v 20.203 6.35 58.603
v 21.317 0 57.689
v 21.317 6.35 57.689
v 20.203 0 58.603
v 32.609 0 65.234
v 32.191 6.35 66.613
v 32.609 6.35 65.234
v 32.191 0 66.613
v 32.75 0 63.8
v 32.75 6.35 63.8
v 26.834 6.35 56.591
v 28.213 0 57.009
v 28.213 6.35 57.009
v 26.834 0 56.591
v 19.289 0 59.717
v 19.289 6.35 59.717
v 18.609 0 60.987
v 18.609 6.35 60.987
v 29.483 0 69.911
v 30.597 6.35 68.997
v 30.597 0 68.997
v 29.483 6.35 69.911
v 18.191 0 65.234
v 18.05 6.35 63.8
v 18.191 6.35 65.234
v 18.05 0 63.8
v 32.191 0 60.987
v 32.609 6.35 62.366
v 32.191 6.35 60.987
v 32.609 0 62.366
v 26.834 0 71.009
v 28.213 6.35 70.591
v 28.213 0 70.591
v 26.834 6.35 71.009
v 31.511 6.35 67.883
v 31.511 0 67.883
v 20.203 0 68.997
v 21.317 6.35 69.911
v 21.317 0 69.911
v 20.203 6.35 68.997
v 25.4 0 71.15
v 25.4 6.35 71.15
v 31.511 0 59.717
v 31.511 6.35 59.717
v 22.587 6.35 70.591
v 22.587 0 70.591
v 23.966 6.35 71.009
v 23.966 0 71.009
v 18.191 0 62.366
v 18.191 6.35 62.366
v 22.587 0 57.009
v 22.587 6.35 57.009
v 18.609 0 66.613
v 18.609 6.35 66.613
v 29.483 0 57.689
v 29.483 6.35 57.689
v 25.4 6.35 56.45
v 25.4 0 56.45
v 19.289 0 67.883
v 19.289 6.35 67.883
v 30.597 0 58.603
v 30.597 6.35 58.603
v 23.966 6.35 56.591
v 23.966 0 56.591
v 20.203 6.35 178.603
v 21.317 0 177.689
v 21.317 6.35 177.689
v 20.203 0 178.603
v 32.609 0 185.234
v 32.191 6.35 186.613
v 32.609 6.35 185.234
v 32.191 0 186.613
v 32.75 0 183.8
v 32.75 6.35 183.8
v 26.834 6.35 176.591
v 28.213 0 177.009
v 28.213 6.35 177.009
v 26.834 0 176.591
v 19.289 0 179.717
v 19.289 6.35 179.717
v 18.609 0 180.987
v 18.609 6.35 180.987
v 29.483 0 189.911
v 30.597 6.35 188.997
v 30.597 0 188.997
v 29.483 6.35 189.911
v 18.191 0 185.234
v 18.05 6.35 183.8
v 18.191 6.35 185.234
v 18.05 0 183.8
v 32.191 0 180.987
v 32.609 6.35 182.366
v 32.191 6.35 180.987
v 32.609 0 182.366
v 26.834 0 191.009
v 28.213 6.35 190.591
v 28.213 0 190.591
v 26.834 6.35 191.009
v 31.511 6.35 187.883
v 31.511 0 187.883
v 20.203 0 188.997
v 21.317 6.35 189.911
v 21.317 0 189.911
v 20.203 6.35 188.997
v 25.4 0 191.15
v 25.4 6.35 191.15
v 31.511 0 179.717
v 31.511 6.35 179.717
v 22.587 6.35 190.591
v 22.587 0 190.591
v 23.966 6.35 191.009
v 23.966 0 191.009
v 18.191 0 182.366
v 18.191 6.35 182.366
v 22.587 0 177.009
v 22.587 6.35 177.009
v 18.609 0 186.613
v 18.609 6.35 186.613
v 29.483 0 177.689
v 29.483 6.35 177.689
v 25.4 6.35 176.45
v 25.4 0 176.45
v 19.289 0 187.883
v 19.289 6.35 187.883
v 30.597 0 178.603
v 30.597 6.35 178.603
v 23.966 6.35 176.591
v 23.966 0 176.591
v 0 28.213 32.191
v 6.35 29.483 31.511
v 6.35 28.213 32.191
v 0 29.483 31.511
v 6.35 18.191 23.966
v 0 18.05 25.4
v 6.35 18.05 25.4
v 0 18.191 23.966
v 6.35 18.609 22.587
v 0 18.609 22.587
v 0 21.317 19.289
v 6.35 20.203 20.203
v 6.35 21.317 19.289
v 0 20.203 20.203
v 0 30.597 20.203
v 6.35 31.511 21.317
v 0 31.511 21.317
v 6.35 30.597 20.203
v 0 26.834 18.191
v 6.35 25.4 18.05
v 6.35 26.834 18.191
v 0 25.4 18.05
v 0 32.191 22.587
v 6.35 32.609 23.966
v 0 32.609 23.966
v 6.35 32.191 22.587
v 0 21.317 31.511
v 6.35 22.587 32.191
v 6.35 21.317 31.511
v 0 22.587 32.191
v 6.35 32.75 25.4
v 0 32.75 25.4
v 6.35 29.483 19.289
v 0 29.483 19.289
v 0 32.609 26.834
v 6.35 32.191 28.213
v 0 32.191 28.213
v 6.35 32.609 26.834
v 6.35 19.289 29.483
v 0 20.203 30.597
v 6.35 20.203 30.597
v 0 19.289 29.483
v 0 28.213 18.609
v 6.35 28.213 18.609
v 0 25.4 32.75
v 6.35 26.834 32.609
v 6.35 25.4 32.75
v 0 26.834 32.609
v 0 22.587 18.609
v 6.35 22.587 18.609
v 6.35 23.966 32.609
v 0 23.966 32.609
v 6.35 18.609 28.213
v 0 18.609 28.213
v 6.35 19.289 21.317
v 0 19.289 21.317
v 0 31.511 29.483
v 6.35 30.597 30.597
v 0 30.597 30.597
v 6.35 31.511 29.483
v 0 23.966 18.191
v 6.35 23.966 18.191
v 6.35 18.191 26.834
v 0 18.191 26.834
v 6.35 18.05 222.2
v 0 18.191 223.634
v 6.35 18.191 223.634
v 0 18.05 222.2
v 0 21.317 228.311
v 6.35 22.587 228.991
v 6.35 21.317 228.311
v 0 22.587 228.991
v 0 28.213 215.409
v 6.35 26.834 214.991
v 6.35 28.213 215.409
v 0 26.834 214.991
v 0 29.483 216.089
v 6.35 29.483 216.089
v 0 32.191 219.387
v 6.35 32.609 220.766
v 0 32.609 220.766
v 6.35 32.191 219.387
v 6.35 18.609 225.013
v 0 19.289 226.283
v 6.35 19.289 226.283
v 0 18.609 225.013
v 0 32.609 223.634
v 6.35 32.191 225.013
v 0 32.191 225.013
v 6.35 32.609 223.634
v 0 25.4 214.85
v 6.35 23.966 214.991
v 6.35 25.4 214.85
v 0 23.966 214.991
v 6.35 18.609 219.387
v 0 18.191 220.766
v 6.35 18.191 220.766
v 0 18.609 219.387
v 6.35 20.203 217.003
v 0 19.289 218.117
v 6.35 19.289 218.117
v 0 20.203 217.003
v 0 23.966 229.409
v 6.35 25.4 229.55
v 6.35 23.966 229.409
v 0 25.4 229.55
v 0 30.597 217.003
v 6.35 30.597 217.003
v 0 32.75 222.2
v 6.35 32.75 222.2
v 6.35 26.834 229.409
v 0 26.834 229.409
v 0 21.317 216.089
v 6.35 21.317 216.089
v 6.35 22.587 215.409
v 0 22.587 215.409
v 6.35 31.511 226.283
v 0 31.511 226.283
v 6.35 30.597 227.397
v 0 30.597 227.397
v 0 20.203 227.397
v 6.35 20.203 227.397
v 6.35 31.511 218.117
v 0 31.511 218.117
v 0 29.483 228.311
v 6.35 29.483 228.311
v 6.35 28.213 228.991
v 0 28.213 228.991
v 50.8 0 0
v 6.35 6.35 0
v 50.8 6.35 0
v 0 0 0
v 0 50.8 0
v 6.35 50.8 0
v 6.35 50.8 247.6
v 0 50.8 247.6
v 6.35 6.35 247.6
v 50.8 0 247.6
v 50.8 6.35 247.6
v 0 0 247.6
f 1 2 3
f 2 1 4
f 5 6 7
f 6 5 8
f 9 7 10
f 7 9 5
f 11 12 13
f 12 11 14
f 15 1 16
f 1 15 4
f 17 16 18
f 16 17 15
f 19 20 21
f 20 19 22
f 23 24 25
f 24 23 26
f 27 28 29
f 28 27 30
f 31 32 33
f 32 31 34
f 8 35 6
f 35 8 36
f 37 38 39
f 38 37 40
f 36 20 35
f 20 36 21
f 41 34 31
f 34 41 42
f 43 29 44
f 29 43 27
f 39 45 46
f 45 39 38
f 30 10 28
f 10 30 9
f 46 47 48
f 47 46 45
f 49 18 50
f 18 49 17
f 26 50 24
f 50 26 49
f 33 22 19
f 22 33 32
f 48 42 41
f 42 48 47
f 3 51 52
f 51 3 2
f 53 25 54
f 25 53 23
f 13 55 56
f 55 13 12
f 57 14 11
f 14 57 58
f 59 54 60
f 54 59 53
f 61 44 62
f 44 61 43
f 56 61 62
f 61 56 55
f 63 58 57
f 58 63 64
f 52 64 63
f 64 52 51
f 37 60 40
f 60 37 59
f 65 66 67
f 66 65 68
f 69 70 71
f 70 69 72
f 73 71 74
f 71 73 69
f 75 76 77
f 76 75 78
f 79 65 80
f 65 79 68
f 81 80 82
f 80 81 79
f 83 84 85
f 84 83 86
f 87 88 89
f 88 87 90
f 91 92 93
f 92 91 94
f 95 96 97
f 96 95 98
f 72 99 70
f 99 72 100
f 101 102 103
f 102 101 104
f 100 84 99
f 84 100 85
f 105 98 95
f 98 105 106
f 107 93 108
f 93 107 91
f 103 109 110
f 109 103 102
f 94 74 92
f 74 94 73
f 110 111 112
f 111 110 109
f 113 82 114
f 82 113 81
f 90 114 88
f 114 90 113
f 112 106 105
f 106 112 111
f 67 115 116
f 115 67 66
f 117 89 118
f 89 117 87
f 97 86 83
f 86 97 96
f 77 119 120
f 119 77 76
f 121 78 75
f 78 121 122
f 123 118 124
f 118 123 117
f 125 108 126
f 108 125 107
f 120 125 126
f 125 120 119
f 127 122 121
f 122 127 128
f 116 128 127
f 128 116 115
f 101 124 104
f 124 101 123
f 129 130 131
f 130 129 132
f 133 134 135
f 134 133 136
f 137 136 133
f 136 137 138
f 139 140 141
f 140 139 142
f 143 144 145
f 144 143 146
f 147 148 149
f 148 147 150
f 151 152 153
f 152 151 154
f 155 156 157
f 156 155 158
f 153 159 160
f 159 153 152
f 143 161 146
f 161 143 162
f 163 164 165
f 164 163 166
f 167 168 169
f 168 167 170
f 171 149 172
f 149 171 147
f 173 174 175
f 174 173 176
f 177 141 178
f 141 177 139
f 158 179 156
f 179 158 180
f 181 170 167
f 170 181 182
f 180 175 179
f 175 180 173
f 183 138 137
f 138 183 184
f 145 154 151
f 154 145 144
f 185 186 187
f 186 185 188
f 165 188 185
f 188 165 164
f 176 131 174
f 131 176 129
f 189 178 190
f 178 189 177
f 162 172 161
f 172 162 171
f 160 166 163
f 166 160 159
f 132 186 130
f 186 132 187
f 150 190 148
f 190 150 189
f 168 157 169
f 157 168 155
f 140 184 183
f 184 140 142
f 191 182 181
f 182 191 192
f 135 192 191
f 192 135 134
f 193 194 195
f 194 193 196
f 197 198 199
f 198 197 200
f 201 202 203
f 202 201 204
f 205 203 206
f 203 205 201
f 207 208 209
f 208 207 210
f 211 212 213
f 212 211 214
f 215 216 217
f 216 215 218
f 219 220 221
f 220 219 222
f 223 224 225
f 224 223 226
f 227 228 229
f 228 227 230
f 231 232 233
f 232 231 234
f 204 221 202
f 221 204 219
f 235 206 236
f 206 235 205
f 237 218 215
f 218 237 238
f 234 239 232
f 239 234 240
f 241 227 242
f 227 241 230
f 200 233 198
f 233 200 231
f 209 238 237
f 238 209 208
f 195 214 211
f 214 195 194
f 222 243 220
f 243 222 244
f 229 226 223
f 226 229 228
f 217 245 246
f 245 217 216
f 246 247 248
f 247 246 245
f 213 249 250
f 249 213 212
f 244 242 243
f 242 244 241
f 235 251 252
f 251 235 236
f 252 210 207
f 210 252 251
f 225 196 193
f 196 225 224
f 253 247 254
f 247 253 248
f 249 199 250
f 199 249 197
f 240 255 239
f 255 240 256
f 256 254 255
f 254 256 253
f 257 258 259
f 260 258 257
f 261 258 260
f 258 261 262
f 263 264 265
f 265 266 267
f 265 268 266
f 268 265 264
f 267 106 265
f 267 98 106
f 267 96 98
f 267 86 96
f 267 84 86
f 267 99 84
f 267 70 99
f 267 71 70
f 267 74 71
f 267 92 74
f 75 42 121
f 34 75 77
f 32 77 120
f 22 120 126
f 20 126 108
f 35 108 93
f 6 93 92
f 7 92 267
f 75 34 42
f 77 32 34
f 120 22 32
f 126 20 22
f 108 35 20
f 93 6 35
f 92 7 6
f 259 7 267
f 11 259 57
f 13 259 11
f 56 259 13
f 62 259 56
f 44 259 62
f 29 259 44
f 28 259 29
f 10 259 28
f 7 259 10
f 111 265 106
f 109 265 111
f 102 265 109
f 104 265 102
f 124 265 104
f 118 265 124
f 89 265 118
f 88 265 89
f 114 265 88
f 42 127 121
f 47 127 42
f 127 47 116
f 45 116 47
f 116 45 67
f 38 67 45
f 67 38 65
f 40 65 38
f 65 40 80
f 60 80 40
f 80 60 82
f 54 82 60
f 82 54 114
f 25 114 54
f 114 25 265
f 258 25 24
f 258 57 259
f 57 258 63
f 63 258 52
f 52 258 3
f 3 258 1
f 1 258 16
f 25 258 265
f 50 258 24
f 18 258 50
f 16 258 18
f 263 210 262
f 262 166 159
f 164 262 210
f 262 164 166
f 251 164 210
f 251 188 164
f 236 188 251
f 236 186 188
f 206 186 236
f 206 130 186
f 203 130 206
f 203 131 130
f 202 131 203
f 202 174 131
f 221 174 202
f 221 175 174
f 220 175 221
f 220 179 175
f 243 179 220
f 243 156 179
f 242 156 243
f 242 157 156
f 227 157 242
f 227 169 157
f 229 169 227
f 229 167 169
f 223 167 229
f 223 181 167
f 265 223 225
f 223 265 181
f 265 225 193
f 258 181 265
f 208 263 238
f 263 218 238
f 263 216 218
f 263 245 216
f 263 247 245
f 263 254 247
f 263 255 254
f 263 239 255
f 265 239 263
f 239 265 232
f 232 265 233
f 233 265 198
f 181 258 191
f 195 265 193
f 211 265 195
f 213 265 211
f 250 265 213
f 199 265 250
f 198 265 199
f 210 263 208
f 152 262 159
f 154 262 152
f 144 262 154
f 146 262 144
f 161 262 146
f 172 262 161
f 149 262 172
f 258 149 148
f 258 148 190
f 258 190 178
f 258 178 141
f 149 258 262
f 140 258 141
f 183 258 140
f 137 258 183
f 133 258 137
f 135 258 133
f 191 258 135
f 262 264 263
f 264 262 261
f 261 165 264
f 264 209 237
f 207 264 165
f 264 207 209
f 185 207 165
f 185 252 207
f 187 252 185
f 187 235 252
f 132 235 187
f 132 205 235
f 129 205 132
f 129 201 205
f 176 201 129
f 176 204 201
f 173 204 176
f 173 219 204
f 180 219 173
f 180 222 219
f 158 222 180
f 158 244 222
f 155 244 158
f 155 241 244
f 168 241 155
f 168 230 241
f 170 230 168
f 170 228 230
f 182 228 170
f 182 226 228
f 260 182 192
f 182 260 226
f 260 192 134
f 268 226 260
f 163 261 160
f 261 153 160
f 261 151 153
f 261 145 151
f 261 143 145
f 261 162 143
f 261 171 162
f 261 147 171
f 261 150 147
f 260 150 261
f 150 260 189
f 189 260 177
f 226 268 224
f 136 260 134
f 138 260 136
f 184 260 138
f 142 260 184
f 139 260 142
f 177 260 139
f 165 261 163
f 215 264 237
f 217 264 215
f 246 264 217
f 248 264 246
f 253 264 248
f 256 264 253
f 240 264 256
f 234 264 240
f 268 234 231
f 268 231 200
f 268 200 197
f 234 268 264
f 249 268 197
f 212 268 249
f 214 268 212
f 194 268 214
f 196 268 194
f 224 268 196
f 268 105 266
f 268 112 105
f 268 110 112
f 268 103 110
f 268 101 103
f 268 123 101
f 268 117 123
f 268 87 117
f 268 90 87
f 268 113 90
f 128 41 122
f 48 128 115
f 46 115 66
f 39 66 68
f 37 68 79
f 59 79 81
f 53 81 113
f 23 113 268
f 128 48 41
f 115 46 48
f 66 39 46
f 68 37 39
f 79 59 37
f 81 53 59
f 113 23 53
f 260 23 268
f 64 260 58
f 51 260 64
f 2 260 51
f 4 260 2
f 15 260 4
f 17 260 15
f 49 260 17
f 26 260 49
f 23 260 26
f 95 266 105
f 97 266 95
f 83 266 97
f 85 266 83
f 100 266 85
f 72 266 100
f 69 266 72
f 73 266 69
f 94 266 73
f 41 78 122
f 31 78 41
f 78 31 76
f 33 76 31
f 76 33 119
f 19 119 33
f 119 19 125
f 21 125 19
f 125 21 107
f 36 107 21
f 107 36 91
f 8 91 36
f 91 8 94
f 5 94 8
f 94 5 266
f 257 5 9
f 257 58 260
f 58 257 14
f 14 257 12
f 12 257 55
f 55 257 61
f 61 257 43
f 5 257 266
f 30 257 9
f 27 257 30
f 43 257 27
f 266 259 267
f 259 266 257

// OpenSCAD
// Part A7: Platform Side Angle Iron (Left and Right)
// Material: 2"×2"×1/4" Angle Iron (50.8mm leg × 6.35mm thickness)
// Quantity: 2 pieces (1 left, 1 right - mirror)
// Location: Folding standing platform, side arms connecting deck to pivot brackets
//
// These are the structural arms that rotate about the pivot point
// They connect the deck plate to the pivot bracket plates

include <../../lifetrac_v25_params.scad>

// =============================================================================
// PART DIMENSIONS
// =============================================================================

_leg = is_undef(PLATFORM_ANGLE_LEG) ? 50.8 : PLATFORM_ANGLE_LEG;       // 2" = 50.8mm
_thick = is_undef(PLATFORM_ANGLE_THICK) ? 6.35 : PLATFORM_ANGLE_THICK; // 1/4" = 6.35mm
_arm_len = is_undef(PLATFORM_ARM_LENGTH) ? 500 : PLATFORM_ARM_LENGTH;
_bracket_width = is_undef(PLATFORM_BRACKET_WIDTH) ? 101.6 : PLATFORM_BRACKET_WIDTH;
_depth = is_undef(PLATFORM_DEPTH) ? 400 : PLATFORM_DEPTH;
_edge_margin = is_undef(PLATFORM_EDGE_MARGIN) ? 12.7 : PLATFORM_EDGE_MARGIN;
_bolt_dia = is_undef(PLATFORM_BOLT_DIA) ? 9.525 : PLATFORM_BOLT_DIA;
_clearance = is_undef(PLATFORM_BOLT_CLEARANCE) ? 0.5 : PLATFORM_BOLT_CLEARANCE;

// Calculate length like in main assembly
_deck_pivot_y = _bracket_width / 2;
_deck_far_y = -(_depth - _bracket_width/2);
_front_corner_y = (_deck_pivot_y - _edge_margin) - _leg;
_rear_corner_y = (_deck_far_y + _edge_margin) + _leg;
_gap = 12.7;
_side_start_y = _front_corner_y - _gap;
_side_end_y = _rear_corner_y + _gap;

PART_A7_LENGTH = _side_start_y - _side_end_y;  // Calculated from geometry
PART_A7_LEG = _leg;
PART_A7_THICK = _thick;

// =============================================================================
// MAIN MODULE
// =============================================================================

/**
 * Part A7: Platform Side Angle Iron
 * L-profile angle iron for platform side arms
 * show_holes: if true, renders bolt holes
 */
module _part_a7_platform_side_angle(show_holes=true) {
    length = PART_A7_LENGTH;
    leg = PART_A7_LEG;
    thick = PART_A7_THICK;
    hole_dia = _bolt_dia + _clearance;
    
    color("DimGray")
    difference() {
        // L-profile extrusion
        linear_extrude(height=length)
        polygon([
            [0, 0],
            [leg, 0],
            [leg, thick],
            [thick, thick],
            [thick, leg],
            [0, leg]
        ]);
        
        if (show_holes) {
            // Pivot bracket attachment holes (through vertical leg)
            // 2 holes near pivot end (start of extrusion)
            _lock_offset = is_undef(PLATFORM_LOCK_OFFSET) ? 130 : PLATFORM_LOCK_OFFSET;
            _side_bolt_y = is_undef(PLATFORM_SIDE_BOLT_Y_OFFSET) ? 25.4 : PLATFORM_SIDE_BOLT_Y_OFFSET;
            _bracket_len = is_undef(PLATFORM_BRACKET_LENGTH) ? 200 : PLATFORM_BRACKET_LENGTH;
            
            _pivot_bolt_offset = (_bracket_len - _bracket_width/2) * 0.30;
            _leg2_len = _bracket_len - _bracket_width/2;
            _bx_1 = _pivot_bolt_offset;
            _bx_2 = _leg2_len - _pivot_bolt_offset;
            
            _corner_y = -_lock_offset + _side_bolt_y;
            _side_angle_start_y_calc = _side_start_y;
            
            z_pos_1 = _side_angle_start_y_calc + _bx_1;
            z_pos_2 = _side_angle_start_y_calc + _bx_2;
            x_pos = leg / 2;
            
            for (z_pos = [z_pos_1, z_pos_2]) {
                translate([x_pos, thick/2, z_pos])
                rotate([90, 0, 0])
                cylinder(d=hole_dia, h=thick + 10, center=true, $fn=32);
            }
            
            // Deck attachment holes (through horizontal leg)
            // 2 holes for deck bolts
            _deck_bolt_offset = max(length * 0.08, 2 * _bolt_dia);
            for (z_pos = [_deck_bolt_offset, length - _deck_bolt_offset]) {
                translate([thick/2, leg/2, z_pos])
                rotate([0, 90, 0])
                cylinder(d=hole_dia, h=thick + 10, center=true, $fn=32);
            }
        }
    }
}

// =============================================================================
// RENDER
// =============================================================================

_part_a7_platform_side_angle(show_holes=true);

echo("=== PART A7: Platform Side Angle Iron ===");
echo("Length:", PART_A7_LENGTH, "mm (", PART_A7_LENGTH/25.4, "in)");
echo("Leg:", PART_A7_LEG, "mm (2 inches)");
echo("Thickness:", PART_A7_THICK, "mm (1/4 inch)");
echo("Holes: 4 total (2 pivot bracket, 2 deck attachment)");
echo("Quantity needed: 2 pieces (left and right, mirrored in assembly)");
